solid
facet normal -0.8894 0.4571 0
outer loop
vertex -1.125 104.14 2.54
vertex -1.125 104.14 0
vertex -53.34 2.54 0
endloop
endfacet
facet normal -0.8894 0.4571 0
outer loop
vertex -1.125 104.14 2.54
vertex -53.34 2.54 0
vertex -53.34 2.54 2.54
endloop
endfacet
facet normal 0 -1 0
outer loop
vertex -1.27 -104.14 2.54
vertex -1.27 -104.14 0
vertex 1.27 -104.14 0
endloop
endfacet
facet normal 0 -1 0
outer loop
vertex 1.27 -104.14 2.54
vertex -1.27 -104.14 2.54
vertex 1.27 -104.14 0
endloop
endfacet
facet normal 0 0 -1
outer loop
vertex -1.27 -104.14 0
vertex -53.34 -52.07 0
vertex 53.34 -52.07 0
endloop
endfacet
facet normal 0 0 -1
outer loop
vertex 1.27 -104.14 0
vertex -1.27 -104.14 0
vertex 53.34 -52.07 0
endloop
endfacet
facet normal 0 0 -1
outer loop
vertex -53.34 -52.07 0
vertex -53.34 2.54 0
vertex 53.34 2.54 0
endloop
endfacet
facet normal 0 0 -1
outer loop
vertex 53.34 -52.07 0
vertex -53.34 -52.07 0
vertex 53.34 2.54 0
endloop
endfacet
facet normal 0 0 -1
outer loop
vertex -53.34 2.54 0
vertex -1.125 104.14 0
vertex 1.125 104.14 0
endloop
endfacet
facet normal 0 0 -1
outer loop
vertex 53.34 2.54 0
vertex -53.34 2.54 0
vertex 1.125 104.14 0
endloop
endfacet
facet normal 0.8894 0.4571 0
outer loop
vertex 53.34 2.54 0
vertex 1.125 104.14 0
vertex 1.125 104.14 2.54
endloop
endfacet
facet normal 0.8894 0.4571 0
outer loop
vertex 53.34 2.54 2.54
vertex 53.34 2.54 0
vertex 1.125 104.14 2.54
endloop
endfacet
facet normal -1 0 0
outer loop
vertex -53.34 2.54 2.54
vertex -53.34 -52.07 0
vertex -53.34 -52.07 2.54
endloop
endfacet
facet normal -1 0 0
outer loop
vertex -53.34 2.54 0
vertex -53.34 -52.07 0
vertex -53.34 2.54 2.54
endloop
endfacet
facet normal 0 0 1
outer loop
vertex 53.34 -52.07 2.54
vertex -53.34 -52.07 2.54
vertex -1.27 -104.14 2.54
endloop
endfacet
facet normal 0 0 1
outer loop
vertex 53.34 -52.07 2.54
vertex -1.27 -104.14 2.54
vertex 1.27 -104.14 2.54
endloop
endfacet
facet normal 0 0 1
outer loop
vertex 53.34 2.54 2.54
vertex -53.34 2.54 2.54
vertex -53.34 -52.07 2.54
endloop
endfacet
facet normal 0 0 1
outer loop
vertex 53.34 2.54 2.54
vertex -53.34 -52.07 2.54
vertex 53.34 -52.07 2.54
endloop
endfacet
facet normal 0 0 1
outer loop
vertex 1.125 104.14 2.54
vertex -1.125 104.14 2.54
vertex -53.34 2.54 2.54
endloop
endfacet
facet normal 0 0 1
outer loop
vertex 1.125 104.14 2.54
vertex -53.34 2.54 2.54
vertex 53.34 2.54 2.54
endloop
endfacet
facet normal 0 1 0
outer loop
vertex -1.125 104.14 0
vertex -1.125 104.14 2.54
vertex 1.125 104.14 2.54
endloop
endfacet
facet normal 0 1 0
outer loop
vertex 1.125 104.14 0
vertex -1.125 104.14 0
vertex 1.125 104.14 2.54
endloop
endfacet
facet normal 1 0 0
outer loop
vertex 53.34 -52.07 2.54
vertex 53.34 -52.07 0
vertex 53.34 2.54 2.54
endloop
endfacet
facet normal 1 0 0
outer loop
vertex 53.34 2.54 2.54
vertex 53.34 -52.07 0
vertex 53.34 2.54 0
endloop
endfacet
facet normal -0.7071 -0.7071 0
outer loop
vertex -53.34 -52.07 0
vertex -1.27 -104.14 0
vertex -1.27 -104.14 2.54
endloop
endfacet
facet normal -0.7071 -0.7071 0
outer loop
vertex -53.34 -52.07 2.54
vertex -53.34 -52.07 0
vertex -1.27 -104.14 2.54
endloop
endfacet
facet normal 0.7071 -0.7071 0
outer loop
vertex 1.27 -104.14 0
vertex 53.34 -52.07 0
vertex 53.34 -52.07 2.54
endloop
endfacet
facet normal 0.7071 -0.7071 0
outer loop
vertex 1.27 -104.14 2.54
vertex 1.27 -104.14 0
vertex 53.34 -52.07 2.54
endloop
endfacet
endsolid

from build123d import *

# Parameters (mm, degrees)
F0_W       = 106.68
F0_H       = 208.28
F1_DEPTH   = 2.54
F2_SIZE    = 52.07
F3_SIZE2   = 52.2153074575
F3_SIZE    = 101.6
F3_2_SIZE2 = 52.2153074575
F3_2_SIZE  = 101.6


with BuildPart() as f1:
    # F0 (on Top) → F1 (new body)
    with BuildSketch(Plane.XY):
        Rectangle(F0_W, F0_H)
    extrude(amount=F1_DEPTH)

    # F2
    f2_edges = [f1.edges().sort_by_distance(p)[0] for p in [
        (-53.34, -104.14, 1.27),
        (53.34, -104.14, 1.27),
    ]]
    chamfer(f2_edges, length=F2_SIZE)

    # F3
    f3_edges = [f1.edges().sort_by_distance(p)[0] for p in [
        (-53.34, 104.14, 1.27),
    ]]
    f3_side = f1.faces().sort_by_distance((-53.34, 26.035, 1.27))[0]
    chamfer(f3_edges, length=F3_SIZE, length2=F3_SIZE2, reference=f3_side)

    # F3#2
    f3_2_edges = [f1.edges().sort_by_distance(p)[0] for p in [
        (53.34, 104.14, 1.27),
    ]]
    f3_2_side = f1.faces().sort_by_distance((53.34, 26.035, 1.27))[0]
    chamfer(f3_2_edges, length=F3_2_SIZE, length2=F3_2_SIZE2, reference=f3_2_side)


solid = f1.part
